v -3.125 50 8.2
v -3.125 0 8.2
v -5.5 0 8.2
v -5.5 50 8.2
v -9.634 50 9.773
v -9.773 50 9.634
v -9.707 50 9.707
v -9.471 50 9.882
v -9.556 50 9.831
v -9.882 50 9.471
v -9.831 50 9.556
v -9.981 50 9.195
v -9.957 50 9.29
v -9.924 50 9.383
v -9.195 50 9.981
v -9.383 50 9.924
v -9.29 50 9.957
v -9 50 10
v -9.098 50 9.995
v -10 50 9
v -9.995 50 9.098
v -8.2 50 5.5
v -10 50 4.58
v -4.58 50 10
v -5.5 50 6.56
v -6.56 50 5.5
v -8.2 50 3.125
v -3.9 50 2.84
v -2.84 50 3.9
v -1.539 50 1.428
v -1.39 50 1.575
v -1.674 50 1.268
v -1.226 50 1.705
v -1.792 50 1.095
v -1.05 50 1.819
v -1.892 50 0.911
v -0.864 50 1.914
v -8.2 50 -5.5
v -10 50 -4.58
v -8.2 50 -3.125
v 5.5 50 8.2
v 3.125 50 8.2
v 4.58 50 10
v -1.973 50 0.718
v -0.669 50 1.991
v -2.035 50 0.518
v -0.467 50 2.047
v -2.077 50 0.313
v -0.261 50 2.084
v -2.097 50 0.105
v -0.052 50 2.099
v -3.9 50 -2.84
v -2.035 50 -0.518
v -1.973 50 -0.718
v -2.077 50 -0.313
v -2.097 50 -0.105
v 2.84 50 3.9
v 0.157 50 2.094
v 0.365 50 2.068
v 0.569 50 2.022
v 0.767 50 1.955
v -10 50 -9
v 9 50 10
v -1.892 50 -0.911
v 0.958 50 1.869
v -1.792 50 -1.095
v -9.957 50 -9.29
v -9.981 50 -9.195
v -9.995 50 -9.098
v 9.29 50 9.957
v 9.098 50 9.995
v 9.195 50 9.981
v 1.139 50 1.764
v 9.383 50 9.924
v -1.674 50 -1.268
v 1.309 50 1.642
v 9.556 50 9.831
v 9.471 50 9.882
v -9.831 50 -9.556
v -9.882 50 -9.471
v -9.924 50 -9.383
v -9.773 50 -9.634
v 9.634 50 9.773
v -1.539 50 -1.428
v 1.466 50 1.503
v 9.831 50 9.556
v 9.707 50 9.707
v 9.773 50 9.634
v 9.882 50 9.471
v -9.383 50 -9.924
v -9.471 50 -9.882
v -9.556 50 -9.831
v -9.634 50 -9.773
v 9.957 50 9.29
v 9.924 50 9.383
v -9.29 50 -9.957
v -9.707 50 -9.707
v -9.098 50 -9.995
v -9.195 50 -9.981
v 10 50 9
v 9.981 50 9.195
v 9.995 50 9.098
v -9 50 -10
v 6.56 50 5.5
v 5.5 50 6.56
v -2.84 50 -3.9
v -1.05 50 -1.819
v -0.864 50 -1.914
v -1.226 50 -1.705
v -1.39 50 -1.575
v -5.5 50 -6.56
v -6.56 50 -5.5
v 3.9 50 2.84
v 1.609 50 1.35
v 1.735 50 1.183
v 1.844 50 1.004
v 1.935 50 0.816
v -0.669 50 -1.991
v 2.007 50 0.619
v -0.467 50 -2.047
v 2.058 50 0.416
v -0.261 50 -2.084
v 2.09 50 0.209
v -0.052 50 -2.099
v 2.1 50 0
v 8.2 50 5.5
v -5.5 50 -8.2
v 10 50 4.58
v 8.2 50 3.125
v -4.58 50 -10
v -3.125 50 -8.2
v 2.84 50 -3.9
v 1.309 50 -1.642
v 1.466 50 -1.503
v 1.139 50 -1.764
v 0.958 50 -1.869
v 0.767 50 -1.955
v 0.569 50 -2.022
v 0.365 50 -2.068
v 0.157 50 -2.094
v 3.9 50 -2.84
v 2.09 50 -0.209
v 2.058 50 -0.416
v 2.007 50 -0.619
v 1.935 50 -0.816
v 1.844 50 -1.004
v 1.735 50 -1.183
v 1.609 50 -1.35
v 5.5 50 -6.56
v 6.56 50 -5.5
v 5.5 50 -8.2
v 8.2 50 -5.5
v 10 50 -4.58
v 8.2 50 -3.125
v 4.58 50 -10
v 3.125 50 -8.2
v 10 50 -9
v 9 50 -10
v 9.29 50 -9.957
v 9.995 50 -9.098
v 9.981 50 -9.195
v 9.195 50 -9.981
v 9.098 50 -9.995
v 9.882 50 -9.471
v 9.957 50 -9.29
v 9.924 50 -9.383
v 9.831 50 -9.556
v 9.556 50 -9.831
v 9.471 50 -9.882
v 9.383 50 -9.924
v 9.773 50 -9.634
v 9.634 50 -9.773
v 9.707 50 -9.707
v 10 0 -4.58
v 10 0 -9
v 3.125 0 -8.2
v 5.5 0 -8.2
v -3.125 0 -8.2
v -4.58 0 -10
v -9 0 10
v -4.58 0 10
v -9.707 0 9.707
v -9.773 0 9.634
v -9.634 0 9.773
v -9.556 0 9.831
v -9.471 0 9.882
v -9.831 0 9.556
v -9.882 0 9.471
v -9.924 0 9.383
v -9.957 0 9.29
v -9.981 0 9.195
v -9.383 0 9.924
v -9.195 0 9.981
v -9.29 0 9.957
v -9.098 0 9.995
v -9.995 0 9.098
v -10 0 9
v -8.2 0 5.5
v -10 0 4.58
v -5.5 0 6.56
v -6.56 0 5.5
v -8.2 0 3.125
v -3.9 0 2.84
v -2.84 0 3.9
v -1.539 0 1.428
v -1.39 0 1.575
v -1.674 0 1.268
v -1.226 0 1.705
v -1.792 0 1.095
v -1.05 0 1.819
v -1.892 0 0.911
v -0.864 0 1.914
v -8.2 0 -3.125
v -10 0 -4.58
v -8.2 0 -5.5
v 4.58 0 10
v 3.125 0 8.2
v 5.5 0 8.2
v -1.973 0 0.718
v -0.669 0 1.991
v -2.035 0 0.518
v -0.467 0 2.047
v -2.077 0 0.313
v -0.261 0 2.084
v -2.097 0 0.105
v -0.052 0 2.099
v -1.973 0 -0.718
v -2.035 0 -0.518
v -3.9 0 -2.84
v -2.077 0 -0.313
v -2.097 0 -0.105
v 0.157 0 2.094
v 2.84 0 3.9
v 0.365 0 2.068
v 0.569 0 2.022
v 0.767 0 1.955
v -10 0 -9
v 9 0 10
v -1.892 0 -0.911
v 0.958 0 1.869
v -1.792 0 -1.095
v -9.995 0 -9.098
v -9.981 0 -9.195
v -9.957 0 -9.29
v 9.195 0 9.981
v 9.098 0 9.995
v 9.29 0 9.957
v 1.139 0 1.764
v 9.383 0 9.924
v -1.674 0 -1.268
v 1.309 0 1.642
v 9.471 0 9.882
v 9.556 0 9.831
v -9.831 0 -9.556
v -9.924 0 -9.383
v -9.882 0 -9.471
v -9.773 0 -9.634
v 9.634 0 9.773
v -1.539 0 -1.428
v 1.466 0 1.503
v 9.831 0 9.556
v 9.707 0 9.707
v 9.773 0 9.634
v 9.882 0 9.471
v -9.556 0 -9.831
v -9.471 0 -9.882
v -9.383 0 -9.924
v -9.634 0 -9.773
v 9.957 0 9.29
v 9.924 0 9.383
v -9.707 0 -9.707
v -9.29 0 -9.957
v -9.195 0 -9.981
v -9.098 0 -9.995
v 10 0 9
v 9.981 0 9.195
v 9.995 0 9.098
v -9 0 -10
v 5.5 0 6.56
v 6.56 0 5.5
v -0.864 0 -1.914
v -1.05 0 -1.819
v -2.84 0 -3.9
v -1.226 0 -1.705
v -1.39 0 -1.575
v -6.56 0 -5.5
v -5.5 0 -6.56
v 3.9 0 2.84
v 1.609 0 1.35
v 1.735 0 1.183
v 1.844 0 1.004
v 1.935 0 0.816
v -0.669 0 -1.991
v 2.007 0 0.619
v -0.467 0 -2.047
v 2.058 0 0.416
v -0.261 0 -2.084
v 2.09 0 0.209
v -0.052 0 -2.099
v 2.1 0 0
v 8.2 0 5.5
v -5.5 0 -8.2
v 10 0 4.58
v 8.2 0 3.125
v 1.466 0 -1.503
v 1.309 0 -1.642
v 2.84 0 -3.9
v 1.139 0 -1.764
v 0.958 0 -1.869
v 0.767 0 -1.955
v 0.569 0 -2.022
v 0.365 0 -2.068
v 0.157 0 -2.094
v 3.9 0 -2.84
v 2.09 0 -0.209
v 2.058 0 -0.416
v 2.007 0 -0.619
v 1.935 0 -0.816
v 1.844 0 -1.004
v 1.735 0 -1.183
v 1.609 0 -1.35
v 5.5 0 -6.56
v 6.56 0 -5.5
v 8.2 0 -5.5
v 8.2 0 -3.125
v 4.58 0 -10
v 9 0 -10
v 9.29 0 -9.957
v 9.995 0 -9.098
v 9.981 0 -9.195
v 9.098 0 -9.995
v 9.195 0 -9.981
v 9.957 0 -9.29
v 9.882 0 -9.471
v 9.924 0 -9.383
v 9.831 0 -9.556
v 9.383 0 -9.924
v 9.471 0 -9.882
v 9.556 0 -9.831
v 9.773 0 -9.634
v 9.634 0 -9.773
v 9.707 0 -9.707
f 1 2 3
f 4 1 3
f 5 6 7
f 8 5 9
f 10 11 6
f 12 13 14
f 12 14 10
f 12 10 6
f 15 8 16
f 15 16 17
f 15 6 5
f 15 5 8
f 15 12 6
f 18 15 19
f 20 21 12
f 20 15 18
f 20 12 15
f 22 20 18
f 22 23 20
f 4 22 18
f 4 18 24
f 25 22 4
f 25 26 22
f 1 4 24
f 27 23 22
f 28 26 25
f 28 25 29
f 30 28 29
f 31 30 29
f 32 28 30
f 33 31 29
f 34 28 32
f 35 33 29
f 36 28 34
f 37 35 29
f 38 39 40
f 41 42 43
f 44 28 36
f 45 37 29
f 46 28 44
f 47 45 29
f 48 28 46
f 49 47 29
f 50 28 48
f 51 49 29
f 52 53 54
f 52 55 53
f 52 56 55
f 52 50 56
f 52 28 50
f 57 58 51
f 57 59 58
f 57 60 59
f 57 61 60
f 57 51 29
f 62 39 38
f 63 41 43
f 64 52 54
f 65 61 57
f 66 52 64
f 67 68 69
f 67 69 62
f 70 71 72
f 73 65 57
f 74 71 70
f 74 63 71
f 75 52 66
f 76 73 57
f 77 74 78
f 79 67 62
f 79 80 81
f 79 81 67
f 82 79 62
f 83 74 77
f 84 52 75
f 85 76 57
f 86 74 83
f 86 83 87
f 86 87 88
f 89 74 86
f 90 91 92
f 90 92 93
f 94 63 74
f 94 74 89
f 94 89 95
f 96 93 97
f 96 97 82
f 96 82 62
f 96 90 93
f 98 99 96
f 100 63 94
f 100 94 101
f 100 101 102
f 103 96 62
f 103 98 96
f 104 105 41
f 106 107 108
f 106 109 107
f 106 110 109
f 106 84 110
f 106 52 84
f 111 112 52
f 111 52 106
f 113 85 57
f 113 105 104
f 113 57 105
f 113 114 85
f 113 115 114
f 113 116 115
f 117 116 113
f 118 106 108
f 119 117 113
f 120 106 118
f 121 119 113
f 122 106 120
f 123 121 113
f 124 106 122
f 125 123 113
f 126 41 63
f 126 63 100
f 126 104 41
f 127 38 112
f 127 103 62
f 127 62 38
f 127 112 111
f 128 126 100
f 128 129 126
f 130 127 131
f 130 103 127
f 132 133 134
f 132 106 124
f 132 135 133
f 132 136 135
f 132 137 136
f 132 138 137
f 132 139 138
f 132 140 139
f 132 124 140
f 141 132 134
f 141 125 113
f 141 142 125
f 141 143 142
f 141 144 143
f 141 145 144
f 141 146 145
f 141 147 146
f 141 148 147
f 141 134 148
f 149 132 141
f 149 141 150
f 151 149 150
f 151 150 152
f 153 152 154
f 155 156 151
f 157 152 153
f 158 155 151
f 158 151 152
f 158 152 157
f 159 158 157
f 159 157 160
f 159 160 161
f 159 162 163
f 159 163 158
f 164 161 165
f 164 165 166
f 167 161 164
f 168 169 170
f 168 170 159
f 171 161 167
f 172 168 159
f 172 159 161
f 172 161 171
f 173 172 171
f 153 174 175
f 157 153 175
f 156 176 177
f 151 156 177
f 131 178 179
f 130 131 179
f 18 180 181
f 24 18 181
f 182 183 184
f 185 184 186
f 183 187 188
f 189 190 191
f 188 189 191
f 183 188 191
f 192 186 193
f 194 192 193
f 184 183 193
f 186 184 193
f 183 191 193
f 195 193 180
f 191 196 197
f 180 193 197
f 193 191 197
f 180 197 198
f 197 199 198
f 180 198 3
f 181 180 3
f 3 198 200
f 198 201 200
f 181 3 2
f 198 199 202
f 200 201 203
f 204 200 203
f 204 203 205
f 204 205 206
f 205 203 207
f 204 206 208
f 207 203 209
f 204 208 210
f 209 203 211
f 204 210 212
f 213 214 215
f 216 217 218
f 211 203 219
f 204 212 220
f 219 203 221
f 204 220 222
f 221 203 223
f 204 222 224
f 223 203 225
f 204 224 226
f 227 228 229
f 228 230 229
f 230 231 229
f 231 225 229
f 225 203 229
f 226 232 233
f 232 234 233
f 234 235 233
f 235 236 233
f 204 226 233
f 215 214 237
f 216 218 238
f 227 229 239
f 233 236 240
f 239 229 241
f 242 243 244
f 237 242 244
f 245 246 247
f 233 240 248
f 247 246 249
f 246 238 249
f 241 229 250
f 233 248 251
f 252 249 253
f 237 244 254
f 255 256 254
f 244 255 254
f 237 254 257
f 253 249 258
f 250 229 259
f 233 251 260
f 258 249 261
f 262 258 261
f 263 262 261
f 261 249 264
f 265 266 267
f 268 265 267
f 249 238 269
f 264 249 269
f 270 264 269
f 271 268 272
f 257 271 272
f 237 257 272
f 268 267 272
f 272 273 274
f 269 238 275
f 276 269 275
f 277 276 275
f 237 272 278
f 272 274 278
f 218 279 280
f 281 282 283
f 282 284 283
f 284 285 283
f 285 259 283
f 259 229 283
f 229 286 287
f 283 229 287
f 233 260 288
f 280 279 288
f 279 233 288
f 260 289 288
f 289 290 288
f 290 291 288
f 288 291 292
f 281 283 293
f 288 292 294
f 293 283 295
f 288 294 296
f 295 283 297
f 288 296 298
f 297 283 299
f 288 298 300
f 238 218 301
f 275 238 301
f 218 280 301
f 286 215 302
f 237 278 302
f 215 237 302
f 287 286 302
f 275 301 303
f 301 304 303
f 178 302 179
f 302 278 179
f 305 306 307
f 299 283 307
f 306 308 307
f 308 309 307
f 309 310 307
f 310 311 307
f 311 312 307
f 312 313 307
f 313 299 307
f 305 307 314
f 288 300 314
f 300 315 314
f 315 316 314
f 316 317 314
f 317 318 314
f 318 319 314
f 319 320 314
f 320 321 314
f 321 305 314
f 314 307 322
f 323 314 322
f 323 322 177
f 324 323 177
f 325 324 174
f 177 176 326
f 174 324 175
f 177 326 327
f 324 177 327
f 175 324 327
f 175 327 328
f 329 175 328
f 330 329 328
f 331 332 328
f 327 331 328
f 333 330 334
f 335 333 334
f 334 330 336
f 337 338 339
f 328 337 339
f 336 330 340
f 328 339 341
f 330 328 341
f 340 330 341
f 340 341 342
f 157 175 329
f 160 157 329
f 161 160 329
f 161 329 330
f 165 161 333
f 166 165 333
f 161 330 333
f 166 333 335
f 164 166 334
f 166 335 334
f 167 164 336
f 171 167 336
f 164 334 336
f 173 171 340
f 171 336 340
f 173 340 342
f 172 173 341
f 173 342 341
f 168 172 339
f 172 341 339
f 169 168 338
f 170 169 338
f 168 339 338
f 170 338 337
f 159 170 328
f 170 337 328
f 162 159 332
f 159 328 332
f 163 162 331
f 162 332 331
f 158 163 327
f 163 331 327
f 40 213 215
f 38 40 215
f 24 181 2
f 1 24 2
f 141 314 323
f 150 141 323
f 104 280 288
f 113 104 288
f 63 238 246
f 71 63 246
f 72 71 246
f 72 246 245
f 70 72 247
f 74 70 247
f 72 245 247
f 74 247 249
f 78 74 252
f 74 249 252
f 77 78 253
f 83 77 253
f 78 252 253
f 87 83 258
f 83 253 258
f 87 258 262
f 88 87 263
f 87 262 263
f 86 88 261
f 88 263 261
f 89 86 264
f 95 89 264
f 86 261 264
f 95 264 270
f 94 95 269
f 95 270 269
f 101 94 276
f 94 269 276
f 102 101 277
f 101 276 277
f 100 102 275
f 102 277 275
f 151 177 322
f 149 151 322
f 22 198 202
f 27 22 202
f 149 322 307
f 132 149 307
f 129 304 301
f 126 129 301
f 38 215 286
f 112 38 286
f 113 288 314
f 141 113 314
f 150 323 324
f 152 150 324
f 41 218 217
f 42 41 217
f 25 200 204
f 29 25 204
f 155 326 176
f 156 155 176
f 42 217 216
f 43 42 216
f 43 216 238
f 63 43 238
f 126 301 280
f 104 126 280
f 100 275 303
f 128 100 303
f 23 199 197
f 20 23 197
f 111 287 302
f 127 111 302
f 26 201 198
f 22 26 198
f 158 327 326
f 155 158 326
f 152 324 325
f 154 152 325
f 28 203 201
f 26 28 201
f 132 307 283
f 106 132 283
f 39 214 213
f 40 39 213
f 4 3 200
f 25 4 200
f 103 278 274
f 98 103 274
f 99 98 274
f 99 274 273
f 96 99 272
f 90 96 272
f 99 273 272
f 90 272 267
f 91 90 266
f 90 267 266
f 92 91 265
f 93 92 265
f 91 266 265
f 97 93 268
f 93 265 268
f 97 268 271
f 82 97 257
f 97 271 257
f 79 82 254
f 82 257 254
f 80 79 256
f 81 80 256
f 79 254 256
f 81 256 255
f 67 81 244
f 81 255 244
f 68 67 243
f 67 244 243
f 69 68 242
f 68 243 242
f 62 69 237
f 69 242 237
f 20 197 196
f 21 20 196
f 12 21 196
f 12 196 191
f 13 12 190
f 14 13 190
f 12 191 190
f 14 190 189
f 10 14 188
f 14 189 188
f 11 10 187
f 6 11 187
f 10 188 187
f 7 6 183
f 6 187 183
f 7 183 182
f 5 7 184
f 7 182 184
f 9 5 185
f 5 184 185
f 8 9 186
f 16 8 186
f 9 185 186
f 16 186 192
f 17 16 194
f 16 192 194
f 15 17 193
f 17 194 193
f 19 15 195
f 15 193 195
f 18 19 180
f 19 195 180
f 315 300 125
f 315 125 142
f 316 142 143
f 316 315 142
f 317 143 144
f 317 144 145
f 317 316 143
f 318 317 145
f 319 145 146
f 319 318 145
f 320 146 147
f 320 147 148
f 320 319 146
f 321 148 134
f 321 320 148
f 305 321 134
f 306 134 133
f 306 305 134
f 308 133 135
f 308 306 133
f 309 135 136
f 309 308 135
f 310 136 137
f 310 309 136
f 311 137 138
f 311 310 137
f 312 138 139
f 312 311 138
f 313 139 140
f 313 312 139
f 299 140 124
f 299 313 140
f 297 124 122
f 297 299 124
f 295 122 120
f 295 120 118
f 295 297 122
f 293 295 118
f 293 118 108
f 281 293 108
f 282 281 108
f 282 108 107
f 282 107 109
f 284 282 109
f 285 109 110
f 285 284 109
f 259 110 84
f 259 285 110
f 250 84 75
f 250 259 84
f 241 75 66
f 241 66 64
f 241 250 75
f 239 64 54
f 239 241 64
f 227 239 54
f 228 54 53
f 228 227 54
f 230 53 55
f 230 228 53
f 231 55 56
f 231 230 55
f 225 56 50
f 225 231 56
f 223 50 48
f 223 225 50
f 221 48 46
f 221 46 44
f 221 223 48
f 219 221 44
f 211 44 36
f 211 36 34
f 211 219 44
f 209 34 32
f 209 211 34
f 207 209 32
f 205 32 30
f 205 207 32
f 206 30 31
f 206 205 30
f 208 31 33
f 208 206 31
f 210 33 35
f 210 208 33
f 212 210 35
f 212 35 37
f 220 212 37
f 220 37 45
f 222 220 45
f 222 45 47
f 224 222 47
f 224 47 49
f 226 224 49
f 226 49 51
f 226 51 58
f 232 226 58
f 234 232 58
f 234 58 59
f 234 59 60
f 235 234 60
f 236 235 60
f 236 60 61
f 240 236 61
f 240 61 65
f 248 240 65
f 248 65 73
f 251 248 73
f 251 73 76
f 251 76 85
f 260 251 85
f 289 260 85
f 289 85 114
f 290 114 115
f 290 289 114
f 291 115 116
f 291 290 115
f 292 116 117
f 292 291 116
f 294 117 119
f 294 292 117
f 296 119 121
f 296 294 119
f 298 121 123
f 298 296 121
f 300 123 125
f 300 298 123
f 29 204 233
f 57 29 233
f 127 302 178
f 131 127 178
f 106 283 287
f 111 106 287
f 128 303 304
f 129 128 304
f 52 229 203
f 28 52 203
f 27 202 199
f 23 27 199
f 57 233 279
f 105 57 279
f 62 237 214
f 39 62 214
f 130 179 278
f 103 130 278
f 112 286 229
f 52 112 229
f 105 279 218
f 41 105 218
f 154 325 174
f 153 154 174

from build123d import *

# Parameters (mm, degrees)
SKETCH1_R           = 2.1
BOSS_EXTRUDE1_DEPTH = 50


with BuildPart() as part:
    # Sketch1 → Boss-Extrude1 (new body)
    with BuildSketch(Plane(origin=(0, 0, 0), x_dir=(1, 0, 0), z_dir=(0, 1, 0))):
        with BuildLine():
            Line((-5.5, 8.2), (-3.125, 8.2))
            Line((-3.125, 8.2), (-4.58, 10))
            Line((-4.58, 10), (-9, 10))
            ThreePointArc((-9, 10), (-9.707106781, 9.707106781), (-10, 9))
            Line((-10, 9), (-10, 4.58))
            Line((-10, 4.58), (-8.2, 3.125))
            Line((-8.2, 3.125), (-8.2, 5.5))
            Line((-8.2, 5.5), (-6.56, 5.5))
            Line((-6.56, 5.5), (-3.9, 2.84))
            Line((-3.9, 2.84), (-3.9, -2.84))
            Line((-3.9, -2.84), (-6.56, -5.5))
            Line((-6.56, -5.5), (-8.2, -5.5))
            Line((-8.2, -5.5), (-8.2, -3.125))
            Line((-8.2, -3.125), (-10, -4.58))
            Line((-10, -4.58), (-10, -9))
            ThreePointArc((-10, -9), (-9.707106781, -9.707106781), (-9, -10))
            Line((-9, -10), (-4.58, -10))
            Line((-4.58, -10), (-3.125, -8.2))
            Line((-3.125, -8.2), (-5.5, -8.2))
            Line((-5.5, -8.2), (-5.5, -6.56))
            Line((-5.5, -6.56), (-2.84, -3.9))
            Line((-2.84, -3.9), (2.84, -3.9))
            Line((2.84, -3.9), (5.5, -6.56))
            Line((5.5, -6.56), (5.5, -8.2))
            Line((5.5, -8.2), (3.125, -8.2))
            Line((3.125, -8.2), (4.58, -10))
            Line((4.58, -10), (9, -10))
            ThreePointArc((9, -10), (9.707106781, -9.707106781), (10, -9))
            Line((10, -9), (10, -4.58))
            Line((10, -4.58), (8.2, -3.125))
            Line((8.2, -3.125), (8.2, -5.5))
            Line((8.2, -5.5), (6.56, -5.5))
            Line((6.56, -5.5), (3.9, -2.84))
            Line((3.9, -2.84), (3.9, 2.84))
            Line((3.9, 2.84), (6.56, 5.5))
            Line((6.56, 5.5), (8.2, 5.5))
            Line((8.2, 5.5), (8.2, 3.125))
            Line((8.2, 3.125), (10, 4.58))
            Line((10, 4.58), (10, 9))
            ThreePointArc((10, 9), (9.707106781, 9.707106781), (9, 10))
            Line((9, 10), (4.58, 10))
            Line((4.58, 10), (3.125, 8.2))
            Line((3.125, 8.2), (5.5, 8.2))
            Line((5.5, 8.2), (5.5, 6.56))
            Line((5.5, 6.56), (2.84, 3.9))
            Line((2.84, 3.9), (-2.84, 3.9))
            Line((-2.84, 3.9), (-5.5, 6.56))
            Line((-5.5, 6.56), (-5.5, 8.2))
        make_face()
        Circle(SKETCH1_R, mode=Mode.SUBTRACT)
    extrude(amount=BOSS_EXTRUDE1_DEPTH)


solid = part.part
